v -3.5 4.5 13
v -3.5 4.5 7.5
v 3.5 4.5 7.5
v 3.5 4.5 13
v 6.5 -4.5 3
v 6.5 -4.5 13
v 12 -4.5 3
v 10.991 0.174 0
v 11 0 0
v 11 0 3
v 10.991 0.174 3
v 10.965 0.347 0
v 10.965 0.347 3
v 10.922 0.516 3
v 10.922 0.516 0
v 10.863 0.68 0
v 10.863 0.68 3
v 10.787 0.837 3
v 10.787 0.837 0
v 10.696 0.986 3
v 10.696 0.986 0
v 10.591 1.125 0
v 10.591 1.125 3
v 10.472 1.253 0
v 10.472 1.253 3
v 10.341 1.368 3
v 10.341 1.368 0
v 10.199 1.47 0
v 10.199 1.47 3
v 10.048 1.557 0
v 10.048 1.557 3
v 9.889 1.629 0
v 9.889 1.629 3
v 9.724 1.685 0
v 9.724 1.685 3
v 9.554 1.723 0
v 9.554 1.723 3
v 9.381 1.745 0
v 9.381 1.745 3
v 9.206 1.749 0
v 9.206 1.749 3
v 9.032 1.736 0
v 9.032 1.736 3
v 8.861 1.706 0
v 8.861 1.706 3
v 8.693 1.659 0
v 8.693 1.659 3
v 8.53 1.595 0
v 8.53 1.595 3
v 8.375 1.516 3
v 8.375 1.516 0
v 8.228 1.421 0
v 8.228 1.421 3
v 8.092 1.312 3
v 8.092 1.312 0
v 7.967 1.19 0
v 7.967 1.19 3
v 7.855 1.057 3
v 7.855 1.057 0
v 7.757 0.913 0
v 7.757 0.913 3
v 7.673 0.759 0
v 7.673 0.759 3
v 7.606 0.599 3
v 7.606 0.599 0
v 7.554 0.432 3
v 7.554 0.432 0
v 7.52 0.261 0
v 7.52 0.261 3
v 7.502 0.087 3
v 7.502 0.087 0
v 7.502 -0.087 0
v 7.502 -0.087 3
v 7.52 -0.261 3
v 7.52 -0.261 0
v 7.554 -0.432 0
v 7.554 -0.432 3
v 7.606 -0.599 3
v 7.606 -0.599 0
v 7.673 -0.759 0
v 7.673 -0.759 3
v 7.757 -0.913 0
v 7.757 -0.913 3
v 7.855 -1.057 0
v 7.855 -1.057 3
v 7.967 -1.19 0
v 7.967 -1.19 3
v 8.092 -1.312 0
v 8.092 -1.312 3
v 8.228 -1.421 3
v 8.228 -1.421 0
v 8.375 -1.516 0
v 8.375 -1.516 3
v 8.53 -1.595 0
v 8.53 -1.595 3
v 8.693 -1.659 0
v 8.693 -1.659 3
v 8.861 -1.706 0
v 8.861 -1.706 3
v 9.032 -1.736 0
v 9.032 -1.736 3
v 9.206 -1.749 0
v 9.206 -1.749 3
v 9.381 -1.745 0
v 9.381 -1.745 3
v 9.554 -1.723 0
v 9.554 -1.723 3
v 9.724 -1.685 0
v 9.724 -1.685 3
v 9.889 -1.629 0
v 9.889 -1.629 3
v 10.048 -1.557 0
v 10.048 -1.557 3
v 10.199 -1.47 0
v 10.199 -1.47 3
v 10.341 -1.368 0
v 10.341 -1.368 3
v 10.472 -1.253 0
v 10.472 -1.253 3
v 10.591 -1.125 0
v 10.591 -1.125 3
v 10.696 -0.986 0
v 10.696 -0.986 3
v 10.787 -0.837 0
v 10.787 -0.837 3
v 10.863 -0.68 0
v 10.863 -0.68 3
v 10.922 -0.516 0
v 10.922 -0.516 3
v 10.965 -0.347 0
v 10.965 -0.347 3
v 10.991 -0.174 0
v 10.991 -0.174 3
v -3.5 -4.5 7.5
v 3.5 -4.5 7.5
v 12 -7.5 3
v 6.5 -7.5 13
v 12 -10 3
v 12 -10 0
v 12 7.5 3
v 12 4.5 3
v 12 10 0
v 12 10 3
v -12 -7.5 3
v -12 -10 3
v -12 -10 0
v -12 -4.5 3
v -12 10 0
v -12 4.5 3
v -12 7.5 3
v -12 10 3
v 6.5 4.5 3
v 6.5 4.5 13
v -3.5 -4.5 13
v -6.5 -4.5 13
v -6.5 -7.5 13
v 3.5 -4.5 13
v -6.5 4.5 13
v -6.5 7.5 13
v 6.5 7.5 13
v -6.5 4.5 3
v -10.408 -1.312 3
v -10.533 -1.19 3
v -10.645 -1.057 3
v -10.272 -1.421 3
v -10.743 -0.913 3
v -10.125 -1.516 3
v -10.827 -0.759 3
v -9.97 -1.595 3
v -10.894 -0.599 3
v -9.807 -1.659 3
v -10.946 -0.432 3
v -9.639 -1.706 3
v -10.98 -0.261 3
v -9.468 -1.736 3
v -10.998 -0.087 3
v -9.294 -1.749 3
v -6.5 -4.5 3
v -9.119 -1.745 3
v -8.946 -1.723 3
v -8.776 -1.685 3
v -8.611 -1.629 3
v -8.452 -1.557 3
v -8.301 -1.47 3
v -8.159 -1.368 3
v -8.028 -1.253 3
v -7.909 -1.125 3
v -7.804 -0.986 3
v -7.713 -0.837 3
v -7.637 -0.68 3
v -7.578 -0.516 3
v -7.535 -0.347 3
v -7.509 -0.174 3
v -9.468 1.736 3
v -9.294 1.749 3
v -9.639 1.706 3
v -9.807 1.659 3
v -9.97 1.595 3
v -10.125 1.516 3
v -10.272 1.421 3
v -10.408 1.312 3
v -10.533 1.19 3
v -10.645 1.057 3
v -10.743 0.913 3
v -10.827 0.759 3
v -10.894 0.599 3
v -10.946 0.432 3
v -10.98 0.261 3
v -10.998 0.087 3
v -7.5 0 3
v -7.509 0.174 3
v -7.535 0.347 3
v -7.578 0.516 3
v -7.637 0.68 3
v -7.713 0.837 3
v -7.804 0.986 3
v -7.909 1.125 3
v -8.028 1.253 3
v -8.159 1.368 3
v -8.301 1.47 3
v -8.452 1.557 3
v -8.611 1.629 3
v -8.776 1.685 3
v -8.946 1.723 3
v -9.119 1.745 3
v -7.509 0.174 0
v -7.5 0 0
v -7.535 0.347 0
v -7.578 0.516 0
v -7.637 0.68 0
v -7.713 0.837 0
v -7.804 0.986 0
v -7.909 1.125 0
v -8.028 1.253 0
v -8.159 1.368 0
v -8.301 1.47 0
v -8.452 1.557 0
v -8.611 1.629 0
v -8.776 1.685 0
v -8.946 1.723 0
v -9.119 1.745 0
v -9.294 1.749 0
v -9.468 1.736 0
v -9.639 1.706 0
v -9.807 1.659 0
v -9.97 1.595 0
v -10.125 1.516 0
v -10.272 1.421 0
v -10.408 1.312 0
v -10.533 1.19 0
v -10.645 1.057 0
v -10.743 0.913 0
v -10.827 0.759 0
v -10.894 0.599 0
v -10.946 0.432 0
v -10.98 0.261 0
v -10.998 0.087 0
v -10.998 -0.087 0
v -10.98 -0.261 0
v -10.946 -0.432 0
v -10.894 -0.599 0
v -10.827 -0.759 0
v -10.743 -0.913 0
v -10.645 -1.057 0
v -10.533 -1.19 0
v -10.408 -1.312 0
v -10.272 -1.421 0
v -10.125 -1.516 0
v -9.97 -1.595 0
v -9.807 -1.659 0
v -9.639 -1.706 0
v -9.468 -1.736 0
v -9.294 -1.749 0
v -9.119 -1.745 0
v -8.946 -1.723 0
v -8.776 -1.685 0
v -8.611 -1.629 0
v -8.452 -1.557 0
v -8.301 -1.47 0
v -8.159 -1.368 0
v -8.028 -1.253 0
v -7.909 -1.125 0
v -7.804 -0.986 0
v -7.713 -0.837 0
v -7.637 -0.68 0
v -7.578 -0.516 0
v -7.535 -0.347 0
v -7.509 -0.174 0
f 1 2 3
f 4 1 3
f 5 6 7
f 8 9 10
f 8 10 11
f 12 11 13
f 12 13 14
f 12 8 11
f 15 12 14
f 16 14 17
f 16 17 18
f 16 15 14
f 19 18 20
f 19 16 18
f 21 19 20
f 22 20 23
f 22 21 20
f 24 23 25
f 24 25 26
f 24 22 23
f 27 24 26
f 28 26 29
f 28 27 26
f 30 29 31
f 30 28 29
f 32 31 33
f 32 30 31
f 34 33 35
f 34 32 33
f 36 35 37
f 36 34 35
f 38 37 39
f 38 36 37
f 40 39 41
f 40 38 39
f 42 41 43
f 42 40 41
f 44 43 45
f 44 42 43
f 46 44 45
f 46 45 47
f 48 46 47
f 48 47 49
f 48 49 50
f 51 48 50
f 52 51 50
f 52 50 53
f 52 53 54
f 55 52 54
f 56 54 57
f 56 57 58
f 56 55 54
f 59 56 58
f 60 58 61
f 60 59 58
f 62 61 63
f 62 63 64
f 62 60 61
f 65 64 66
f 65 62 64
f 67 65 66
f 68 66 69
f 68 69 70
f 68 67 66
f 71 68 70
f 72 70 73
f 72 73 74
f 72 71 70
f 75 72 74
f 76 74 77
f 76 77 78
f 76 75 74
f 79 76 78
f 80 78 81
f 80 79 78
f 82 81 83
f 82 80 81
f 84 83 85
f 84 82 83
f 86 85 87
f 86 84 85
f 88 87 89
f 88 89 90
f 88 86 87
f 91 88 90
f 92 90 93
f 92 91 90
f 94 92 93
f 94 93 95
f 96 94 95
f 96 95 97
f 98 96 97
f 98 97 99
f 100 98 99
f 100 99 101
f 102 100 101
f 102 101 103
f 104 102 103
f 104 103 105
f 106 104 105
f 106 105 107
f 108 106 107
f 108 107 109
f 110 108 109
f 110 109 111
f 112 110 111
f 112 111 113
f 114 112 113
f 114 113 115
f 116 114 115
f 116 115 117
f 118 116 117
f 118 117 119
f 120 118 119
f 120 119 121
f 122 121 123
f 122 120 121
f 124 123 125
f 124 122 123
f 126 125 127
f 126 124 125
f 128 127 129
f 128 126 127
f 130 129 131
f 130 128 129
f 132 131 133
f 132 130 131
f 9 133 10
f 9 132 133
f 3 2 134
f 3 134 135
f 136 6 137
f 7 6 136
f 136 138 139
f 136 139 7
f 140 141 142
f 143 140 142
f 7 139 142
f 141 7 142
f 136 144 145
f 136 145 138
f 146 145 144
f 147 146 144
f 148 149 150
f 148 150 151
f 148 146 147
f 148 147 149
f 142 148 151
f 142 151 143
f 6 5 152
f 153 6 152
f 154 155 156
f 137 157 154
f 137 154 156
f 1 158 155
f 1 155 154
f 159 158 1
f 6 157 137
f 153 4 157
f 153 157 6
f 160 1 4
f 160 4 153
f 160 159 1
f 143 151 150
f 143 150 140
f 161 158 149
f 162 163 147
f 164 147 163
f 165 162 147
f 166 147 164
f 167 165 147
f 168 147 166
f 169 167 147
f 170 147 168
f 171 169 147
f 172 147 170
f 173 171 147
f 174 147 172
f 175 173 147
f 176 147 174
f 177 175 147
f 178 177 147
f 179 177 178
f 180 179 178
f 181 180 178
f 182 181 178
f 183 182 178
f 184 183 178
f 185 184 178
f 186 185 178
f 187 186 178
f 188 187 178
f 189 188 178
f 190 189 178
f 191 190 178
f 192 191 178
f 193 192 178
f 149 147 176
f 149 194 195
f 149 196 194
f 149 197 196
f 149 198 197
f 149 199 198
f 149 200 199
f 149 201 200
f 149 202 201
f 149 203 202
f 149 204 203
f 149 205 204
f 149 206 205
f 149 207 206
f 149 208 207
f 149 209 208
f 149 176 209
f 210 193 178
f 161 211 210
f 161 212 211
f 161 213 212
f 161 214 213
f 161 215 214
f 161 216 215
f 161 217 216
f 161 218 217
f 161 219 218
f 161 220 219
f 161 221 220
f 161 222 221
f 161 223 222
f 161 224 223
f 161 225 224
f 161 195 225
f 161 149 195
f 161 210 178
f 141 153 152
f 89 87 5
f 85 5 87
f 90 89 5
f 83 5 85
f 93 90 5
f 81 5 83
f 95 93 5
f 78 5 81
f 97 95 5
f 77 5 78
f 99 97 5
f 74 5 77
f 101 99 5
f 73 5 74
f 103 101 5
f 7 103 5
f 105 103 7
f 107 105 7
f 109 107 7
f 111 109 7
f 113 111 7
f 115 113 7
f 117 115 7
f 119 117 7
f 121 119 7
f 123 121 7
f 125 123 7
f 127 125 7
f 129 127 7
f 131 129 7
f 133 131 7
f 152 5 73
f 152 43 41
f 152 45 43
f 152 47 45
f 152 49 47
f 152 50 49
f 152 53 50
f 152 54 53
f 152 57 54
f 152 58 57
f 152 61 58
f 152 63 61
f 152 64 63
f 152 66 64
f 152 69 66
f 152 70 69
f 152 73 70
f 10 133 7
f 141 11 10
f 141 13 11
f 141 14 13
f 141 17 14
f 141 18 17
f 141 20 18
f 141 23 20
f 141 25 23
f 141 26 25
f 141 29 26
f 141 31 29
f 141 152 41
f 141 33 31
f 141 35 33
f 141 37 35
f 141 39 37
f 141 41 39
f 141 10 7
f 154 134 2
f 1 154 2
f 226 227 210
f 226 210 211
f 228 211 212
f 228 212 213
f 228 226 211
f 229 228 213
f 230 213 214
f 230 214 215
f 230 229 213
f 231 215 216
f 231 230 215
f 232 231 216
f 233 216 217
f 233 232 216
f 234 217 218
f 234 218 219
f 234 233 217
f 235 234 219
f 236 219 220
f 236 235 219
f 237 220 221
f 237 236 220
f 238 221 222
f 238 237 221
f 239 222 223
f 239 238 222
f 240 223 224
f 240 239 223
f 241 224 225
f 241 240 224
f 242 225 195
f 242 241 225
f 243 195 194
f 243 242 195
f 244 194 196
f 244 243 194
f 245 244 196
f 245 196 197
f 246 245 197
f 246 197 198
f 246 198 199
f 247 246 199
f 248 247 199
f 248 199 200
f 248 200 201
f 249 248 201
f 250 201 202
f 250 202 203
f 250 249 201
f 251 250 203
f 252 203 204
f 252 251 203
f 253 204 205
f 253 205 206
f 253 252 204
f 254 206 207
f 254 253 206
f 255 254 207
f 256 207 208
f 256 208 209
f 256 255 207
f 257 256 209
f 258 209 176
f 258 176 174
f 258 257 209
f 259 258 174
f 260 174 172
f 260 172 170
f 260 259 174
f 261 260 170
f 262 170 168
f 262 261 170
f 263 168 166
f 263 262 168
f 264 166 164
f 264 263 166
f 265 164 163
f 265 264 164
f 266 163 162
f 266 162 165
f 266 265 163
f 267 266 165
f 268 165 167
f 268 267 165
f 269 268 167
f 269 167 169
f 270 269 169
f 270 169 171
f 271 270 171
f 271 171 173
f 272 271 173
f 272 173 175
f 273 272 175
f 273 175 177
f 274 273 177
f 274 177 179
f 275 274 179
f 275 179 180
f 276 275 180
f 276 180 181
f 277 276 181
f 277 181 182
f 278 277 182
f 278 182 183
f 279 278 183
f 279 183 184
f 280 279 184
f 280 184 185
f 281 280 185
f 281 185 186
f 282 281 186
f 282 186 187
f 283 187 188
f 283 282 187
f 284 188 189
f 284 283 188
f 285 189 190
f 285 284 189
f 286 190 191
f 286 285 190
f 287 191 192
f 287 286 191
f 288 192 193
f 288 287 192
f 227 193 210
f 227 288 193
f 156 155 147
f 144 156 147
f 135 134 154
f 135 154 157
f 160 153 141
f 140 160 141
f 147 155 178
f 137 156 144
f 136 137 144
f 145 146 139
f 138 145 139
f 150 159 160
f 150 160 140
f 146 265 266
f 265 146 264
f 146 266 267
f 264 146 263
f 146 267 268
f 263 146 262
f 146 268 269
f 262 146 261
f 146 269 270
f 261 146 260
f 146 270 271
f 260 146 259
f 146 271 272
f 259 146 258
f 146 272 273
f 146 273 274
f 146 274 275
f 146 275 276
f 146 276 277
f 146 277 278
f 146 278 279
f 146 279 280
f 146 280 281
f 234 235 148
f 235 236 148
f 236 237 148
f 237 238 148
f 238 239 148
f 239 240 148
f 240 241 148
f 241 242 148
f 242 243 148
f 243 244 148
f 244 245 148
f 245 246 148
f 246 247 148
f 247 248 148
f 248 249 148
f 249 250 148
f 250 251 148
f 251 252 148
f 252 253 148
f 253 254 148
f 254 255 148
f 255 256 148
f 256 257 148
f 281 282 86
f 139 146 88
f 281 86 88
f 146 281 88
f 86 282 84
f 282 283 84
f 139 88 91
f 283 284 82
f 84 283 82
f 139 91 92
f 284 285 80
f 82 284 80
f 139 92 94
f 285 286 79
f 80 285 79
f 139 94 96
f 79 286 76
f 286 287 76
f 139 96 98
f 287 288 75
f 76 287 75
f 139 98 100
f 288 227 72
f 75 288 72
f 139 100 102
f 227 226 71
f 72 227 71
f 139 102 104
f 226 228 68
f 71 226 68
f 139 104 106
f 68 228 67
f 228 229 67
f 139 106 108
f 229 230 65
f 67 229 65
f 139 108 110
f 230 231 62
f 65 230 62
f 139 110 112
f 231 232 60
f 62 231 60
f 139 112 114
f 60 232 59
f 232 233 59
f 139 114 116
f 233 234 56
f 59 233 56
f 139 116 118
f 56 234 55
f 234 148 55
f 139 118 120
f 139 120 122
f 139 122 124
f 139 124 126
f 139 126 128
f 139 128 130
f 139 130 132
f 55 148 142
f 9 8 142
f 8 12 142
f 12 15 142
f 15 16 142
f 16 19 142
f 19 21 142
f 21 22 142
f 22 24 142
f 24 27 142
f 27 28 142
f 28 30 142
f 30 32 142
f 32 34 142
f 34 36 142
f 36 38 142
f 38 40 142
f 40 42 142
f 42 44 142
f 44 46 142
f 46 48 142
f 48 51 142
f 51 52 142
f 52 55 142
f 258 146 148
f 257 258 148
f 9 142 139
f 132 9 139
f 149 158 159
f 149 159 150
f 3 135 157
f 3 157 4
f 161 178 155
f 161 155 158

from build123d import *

# Parameters (mm, degrees)
ESQUISSE1_W               = 24
ESQUISSE1_H               = 20
ESQUISSE1_R               = 1.75
ESQUISSE1_W_2             = 13
ESQUISSE1_H_2             = 15
BOSS_EXTRU_1_DEPTH        = 3
ESQUISSE1_3_W             = 13
ESQUISSE1_3_H             = 15
ESQUISSE1_3_W_2           = 7
ESQUISSE1_3_H_2           = 9
BOSS_EXTRU_2_DEPTH        = 13
NERVURE2_REACH            = 26.885
ESQUISSE5_WALL_W          = 63.182180764
ESQUISSE5_WALL_H          = 3
SYM_TRIE5_COPY_1_REACH    = 26.885
SYM_TRIE5_COPY_1_SKETCH_W = 63.182180764
SYM_TRIE5_COPY_1_SKETCH_H = 3
ESQUISSE1_4_W             = 7
ESQUISSE1_4_H             = 9
BOSS_EXTRU_3_DEPTH        = 7.5


with BuildPart() as part:
    # Esquisse1 → Boss.-Extru.1 (new body)
    with BuildSketch(Plane.XY):
        Rectangle(ESQUISSE1_W, ESQUISSE1_H)
        with Locations((-9.25, 0)):
            Circle(ESQUISSE1_R, mode=Mode.SUBTRACT)
        with Locations((9.25, 0)):
            Circle(ESQUISSE1_R, mode=Mode.SUBTRACT)
        Rectangle(ESQUISSE1_W_2, ESQUISSE1_H_2, mode=Mode.SUBTRACT)
    extrude(amount=BOSS_EXTRU_1_DEPTH)

    # Esquisse1<3> → Boss.-Extru.2 (add)
    with BuildSketch(Plane.XY):
        Rectangle(ESQUISSE1_3_W, ESQUISSE1_3_H)
        Rectangle(ESQUISSE1_3_W_2, ESQUISSE1_3_H_2, mode=Mode.SUBTRACT)
    extrude(amount=BOSS_EXTRU_2_DEPTH)

    # Esquisse5 wall → Nervure2 (add, up to next)
    with BuildSketch(Plane(origin=(-9.25, -7.5, 8), x_dir=(-0.481918749772, 0, -0.876215908677), z_dir=(0.876215908677, 0, -0.481918749772)), mode=Mode.PRIVATE) as nervure2_sk1:
        with Locations((0, 1.5)):
            Rectangle(ESQUISSE5_WALL_W, ESQUISSE5_WALL_H)
    nervure2_tool1 = extrude(nervure2_sk1.sketch, amount=NERVURE2_REACH, mode=Mode.PRIVATE) - part.part
    nervure2 = nervure2_tool1.solids().sort_by_distance((-9.25, -7.5, 8))[0]
    add(nervure2)

    # Symétrie4: Nervure2 across plane
    add(nervure2.mirror(Plane.ZX))

    # Symétrie5: Nervure2 across plane
    add(nervure2.mirror(Plane(origin=(0, 0, 0), x_dir=(0, 0, 1), z_dir=(1, 0, 0))))

    # Symétrie5 copy 1 sketch → Symétrie5 copy 1 (add, up to next)
    with BuildSketch(Plane(origin=(9.25, 7.5, 8), x_dir=(0.481918749772, 0, -0.876215908677), z_dir=(-0.876215908677, 0, -0.481918749772)), mode=Mode.PRIVATE) as sym_trie5_copy_1_sk1:
        with Locations((0, 1.5)):
            Rectangle(SYM_TRIE5_COPY_1_SKETCH_W, SYM_TRIE5_COPY_1_SKETCH_H)
    sym_trie5_copy_1_tool1 = extrude(sym_trie5_copy_1_sk1.sketch, amount=SYM_TRIE5_COPY_1_REACH, mode=Mode.PRIVATE) - part.part
    add(sym_trie5_copy_1_tool1.solids().sort_by_distance((9.25, 7.5, 8))[0])

    # Esquisse1<4> → Boss.-Extru.3 (add)
    with BuildSketch(Plane.XY):
        Rectangle(ESQUISSE1_4_W, ESQUISSE1_4_H)
    extrude(amount=BOSS_EXTRU_3_DEPTH)


solid = part.part
